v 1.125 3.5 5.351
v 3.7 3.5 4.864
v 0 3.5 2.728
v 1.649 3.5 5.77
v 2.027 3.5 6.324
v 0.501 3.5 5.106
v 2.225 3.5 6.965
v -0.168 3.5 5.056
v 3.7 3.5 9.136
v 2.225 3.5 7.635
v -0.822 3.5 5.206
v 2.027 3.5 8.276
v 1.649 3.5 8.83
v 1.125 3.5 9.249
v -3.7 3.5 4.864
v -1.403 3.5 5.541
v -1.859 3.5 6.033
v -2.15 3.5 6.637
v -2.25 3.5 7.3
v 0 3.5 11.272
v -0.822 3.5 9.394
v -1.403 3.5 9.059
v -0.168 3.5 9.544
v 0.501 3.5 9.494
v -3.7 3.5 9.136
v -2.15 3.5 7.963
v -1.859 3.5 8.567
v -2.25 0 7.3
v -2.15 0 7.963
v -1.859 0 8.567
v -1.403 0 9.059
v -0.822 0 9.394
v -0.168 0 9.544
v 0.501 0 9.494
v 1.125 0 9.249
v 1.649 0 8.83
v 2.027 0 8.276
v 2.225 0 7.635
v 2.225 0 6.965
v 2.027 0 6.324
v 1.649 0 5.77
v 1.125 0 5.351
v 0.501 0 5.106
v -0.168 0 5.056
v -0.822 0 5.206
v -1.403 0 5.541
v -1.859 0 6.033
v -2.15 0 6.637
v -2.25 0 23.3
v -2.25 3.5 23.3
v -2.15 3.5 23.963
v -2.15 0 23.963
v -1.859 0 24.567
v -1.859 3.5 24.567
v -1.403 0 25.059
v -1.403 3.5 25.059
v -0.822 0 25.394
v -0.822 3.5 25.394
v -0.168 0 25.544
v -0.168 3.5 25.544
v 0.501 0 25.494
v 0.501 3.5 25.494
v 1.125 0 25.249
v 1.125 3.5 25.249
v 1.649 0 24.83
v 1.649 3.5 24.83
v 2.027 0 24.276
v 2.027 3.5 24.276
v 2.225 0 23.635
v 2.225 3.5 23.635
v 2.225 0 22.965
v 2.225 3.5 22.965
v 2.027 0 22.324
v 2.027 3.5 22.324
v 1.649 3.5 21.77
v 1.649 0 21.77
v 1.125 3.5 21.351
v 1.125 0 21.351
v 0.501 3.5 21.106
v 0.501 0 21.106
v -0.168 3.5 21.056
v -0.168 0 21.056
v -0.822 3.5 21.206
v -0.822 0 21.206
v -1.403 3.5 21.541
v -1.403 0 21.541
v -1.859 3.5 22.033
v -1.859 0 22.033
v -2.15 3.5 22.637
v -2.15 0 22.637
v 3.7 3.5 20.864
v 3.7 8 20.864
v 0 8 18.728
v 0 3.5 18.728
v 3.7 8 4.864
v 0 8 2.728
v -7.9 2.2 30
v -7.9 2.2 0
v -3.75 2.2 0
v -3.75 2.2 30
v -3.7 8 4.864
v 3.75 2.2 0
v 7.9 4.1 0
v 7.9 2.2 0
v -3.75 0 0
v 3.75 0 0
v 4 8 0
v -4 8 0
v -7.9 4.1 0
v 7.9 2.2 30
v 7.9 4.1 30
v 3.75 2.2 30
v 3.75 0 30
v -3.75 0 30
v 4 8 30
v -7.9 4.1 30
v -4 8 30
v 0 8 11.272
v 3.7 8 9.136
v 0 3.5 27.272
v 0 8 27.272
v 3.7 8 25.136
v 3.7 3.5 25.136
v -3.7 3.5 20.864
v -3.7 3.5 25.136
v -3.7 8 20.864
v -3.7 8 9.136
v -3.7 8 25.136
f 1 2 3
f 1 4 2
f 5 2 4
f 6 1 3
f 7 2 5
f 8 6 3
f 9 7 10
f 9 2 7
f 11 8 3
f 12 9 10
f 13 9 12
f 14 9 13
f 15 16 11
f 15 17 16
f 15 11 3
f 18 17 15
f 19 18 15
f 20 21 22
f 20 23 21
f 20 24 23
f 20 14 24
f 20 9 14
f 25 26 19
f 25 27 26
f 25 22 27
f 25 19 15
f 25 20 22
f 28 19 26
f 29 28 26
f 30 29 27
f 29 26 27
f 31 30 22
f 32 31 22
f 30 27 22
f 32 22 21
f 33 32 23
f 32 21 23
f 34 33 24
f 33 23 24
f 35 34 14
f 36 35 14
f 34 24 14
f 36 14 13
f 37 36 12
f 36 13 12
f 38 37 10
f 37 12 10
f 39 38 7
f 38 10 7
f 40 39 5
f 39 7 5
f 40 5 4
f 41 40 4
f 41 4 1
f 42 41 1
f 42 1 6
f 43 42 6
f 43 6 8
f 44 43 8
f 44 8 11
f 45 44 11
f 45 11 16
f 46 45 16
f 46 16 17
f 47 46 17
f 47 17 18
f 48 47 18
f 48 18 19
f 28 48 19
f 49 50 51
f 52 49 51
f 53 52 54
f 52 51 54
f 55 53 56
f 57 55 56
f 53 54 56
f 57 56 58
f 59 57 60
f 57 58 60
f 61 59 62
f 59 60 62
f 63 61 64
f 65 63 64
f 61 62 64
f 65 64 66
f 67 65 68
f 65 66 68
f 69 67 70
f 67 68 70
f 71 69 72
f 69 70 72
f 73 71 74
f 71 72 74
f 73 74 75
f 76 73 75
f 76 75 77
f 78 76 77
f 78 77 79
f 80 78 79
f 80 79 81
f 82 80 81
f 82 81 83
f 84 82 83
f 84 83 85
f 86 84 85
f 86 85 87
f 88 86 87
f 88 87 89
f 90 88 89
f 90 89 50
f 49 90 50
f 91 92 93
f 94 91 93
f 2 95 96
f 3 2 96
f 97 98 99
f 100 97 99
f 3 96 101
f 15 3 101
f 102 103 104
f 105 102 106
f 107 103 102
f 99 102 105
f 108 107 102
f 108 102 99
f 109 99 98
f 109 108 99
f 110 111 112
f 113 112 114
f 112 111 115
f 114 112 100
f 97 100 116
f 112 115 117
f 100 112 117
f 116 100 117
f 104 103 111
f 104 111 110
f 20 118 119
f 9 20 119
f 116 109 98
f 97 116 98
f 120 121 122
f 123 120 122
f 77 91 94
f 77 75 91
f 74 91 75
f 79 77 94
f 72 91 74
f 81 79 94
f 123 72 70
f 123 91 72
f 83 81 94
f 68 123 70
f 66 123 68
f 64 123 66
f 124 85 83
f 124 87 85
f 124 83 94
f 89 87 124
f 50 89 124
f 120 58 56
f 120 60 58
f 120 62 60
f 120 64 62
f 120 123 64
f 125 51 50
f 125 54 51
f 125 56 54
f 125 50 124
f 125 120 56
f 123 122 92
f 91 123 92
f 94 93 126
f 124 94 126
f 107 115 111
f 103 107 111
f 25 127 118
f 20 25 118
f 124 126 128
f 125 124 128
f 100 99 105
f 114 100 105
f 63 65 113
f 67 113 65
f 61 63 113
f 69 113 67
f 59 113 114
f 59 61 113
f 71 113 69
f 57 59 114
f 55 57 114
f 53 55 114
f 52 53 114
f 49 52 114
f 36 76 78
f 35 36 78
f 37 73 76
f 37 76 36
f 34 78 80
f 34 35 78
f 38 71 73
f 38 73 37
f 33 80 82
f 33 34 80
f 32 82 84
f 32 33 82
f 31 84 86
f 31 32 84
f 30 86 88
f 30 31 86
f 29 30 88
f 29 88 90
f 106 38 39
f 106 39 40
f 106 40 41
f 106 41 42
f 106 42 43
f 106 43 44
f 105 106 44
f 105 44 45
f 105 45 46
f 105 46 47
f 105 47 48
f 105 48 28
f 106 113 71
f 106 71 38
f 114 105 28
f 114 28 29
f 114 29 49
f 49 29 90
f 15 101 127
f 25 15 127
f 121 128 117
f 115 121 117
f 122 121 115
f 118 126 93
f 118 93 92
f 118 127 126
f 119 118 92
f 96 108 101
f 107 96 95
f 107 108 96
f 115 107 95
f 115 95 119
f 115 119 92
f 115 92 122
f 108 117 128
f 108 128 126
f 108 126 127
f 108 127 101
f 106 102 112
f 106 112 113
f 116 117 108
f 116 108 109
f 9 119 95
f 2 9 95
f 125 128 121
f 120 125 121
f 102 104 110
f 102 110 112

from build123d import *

# Parameters (mm, degrees)
PAD002_DEPTH           = 30
POCKET_DEPTH           = 4.5
LINEARPATTERN_COUNT    = 2
LINEARPATTERN_PITCH    = 16
SKETCH003_R            = 2.25
HOLE_DEPTH             = 25
LINEARPATTERN001_COUNT = 2
LINEARPATTERN001_PITCH = 16


with BuildPart() as part:
    # Sketch002 → Pad002 (new body)
    with BuildSketch(Plane.XY):
        Polygon((0, 0), (0, 8), (-4, 8), (-7.9, 4.1), (-7.9, 2.2), (-3.75, 2.2), (-3.75, 0), align=None)
    pad002 = extrude(amount=PAD002_DEPTH)

    # Mirrored: Pad002 across Sketch002 V_Axis
    add(pad002.mirror(Plane(origin=(0, 0, 0), x_dir=(0, 0, 1), z_dir=(1, 0, 0))))

    # Sketch (on DatumPlane) → Pocket (cut)
    with BuildSketch(Plane(origin=(0, 8, 0), x_dir=(-1, 0, 0), z_dir=(0, 1, 0))):
        Polygon((0, 2.727608), (3.7, 4.863804), (3.7, 9.136196), (0, 11.272392), (-3.7, 9.136196), (-3.7, 4.863804), align=None)
    pocket = extrude(amount=-POCKET_DEPTH, mode=Mode.SUBTRACT)

    # LinearPattern: Pocket ×2
    with Locations(*[(0, 0, i * LINEARPATTERN_PITCH) for i in range(1, LINEARPATTERN_COUNT)]):
        add(pocket, mode=Mode.SUBTRACT)

    # Sketch003 (on DatumPlane) → Hole (cut)
    with BuildSketch(Plane(origin=(0, 8, 0), x_dir=(-1, 0, 0), z_dir=(0, 1, 0))):
        with Locations((0, 7.3)):
            Circle(SKETCH003_R)
    hole = extrude(amount=-HOLE_DEPTH, mode=Mode.SUBTRACT)

    # LinearPattern001: Hole ×2
    with Locations(*[(0, 0, i * LINEARPATTERN001_PITCH) for i in range(1, LINEARPATTERN001_COUNT)]):
        add(hole, mode=Mode.SUBTRACT)


solid = part.part
